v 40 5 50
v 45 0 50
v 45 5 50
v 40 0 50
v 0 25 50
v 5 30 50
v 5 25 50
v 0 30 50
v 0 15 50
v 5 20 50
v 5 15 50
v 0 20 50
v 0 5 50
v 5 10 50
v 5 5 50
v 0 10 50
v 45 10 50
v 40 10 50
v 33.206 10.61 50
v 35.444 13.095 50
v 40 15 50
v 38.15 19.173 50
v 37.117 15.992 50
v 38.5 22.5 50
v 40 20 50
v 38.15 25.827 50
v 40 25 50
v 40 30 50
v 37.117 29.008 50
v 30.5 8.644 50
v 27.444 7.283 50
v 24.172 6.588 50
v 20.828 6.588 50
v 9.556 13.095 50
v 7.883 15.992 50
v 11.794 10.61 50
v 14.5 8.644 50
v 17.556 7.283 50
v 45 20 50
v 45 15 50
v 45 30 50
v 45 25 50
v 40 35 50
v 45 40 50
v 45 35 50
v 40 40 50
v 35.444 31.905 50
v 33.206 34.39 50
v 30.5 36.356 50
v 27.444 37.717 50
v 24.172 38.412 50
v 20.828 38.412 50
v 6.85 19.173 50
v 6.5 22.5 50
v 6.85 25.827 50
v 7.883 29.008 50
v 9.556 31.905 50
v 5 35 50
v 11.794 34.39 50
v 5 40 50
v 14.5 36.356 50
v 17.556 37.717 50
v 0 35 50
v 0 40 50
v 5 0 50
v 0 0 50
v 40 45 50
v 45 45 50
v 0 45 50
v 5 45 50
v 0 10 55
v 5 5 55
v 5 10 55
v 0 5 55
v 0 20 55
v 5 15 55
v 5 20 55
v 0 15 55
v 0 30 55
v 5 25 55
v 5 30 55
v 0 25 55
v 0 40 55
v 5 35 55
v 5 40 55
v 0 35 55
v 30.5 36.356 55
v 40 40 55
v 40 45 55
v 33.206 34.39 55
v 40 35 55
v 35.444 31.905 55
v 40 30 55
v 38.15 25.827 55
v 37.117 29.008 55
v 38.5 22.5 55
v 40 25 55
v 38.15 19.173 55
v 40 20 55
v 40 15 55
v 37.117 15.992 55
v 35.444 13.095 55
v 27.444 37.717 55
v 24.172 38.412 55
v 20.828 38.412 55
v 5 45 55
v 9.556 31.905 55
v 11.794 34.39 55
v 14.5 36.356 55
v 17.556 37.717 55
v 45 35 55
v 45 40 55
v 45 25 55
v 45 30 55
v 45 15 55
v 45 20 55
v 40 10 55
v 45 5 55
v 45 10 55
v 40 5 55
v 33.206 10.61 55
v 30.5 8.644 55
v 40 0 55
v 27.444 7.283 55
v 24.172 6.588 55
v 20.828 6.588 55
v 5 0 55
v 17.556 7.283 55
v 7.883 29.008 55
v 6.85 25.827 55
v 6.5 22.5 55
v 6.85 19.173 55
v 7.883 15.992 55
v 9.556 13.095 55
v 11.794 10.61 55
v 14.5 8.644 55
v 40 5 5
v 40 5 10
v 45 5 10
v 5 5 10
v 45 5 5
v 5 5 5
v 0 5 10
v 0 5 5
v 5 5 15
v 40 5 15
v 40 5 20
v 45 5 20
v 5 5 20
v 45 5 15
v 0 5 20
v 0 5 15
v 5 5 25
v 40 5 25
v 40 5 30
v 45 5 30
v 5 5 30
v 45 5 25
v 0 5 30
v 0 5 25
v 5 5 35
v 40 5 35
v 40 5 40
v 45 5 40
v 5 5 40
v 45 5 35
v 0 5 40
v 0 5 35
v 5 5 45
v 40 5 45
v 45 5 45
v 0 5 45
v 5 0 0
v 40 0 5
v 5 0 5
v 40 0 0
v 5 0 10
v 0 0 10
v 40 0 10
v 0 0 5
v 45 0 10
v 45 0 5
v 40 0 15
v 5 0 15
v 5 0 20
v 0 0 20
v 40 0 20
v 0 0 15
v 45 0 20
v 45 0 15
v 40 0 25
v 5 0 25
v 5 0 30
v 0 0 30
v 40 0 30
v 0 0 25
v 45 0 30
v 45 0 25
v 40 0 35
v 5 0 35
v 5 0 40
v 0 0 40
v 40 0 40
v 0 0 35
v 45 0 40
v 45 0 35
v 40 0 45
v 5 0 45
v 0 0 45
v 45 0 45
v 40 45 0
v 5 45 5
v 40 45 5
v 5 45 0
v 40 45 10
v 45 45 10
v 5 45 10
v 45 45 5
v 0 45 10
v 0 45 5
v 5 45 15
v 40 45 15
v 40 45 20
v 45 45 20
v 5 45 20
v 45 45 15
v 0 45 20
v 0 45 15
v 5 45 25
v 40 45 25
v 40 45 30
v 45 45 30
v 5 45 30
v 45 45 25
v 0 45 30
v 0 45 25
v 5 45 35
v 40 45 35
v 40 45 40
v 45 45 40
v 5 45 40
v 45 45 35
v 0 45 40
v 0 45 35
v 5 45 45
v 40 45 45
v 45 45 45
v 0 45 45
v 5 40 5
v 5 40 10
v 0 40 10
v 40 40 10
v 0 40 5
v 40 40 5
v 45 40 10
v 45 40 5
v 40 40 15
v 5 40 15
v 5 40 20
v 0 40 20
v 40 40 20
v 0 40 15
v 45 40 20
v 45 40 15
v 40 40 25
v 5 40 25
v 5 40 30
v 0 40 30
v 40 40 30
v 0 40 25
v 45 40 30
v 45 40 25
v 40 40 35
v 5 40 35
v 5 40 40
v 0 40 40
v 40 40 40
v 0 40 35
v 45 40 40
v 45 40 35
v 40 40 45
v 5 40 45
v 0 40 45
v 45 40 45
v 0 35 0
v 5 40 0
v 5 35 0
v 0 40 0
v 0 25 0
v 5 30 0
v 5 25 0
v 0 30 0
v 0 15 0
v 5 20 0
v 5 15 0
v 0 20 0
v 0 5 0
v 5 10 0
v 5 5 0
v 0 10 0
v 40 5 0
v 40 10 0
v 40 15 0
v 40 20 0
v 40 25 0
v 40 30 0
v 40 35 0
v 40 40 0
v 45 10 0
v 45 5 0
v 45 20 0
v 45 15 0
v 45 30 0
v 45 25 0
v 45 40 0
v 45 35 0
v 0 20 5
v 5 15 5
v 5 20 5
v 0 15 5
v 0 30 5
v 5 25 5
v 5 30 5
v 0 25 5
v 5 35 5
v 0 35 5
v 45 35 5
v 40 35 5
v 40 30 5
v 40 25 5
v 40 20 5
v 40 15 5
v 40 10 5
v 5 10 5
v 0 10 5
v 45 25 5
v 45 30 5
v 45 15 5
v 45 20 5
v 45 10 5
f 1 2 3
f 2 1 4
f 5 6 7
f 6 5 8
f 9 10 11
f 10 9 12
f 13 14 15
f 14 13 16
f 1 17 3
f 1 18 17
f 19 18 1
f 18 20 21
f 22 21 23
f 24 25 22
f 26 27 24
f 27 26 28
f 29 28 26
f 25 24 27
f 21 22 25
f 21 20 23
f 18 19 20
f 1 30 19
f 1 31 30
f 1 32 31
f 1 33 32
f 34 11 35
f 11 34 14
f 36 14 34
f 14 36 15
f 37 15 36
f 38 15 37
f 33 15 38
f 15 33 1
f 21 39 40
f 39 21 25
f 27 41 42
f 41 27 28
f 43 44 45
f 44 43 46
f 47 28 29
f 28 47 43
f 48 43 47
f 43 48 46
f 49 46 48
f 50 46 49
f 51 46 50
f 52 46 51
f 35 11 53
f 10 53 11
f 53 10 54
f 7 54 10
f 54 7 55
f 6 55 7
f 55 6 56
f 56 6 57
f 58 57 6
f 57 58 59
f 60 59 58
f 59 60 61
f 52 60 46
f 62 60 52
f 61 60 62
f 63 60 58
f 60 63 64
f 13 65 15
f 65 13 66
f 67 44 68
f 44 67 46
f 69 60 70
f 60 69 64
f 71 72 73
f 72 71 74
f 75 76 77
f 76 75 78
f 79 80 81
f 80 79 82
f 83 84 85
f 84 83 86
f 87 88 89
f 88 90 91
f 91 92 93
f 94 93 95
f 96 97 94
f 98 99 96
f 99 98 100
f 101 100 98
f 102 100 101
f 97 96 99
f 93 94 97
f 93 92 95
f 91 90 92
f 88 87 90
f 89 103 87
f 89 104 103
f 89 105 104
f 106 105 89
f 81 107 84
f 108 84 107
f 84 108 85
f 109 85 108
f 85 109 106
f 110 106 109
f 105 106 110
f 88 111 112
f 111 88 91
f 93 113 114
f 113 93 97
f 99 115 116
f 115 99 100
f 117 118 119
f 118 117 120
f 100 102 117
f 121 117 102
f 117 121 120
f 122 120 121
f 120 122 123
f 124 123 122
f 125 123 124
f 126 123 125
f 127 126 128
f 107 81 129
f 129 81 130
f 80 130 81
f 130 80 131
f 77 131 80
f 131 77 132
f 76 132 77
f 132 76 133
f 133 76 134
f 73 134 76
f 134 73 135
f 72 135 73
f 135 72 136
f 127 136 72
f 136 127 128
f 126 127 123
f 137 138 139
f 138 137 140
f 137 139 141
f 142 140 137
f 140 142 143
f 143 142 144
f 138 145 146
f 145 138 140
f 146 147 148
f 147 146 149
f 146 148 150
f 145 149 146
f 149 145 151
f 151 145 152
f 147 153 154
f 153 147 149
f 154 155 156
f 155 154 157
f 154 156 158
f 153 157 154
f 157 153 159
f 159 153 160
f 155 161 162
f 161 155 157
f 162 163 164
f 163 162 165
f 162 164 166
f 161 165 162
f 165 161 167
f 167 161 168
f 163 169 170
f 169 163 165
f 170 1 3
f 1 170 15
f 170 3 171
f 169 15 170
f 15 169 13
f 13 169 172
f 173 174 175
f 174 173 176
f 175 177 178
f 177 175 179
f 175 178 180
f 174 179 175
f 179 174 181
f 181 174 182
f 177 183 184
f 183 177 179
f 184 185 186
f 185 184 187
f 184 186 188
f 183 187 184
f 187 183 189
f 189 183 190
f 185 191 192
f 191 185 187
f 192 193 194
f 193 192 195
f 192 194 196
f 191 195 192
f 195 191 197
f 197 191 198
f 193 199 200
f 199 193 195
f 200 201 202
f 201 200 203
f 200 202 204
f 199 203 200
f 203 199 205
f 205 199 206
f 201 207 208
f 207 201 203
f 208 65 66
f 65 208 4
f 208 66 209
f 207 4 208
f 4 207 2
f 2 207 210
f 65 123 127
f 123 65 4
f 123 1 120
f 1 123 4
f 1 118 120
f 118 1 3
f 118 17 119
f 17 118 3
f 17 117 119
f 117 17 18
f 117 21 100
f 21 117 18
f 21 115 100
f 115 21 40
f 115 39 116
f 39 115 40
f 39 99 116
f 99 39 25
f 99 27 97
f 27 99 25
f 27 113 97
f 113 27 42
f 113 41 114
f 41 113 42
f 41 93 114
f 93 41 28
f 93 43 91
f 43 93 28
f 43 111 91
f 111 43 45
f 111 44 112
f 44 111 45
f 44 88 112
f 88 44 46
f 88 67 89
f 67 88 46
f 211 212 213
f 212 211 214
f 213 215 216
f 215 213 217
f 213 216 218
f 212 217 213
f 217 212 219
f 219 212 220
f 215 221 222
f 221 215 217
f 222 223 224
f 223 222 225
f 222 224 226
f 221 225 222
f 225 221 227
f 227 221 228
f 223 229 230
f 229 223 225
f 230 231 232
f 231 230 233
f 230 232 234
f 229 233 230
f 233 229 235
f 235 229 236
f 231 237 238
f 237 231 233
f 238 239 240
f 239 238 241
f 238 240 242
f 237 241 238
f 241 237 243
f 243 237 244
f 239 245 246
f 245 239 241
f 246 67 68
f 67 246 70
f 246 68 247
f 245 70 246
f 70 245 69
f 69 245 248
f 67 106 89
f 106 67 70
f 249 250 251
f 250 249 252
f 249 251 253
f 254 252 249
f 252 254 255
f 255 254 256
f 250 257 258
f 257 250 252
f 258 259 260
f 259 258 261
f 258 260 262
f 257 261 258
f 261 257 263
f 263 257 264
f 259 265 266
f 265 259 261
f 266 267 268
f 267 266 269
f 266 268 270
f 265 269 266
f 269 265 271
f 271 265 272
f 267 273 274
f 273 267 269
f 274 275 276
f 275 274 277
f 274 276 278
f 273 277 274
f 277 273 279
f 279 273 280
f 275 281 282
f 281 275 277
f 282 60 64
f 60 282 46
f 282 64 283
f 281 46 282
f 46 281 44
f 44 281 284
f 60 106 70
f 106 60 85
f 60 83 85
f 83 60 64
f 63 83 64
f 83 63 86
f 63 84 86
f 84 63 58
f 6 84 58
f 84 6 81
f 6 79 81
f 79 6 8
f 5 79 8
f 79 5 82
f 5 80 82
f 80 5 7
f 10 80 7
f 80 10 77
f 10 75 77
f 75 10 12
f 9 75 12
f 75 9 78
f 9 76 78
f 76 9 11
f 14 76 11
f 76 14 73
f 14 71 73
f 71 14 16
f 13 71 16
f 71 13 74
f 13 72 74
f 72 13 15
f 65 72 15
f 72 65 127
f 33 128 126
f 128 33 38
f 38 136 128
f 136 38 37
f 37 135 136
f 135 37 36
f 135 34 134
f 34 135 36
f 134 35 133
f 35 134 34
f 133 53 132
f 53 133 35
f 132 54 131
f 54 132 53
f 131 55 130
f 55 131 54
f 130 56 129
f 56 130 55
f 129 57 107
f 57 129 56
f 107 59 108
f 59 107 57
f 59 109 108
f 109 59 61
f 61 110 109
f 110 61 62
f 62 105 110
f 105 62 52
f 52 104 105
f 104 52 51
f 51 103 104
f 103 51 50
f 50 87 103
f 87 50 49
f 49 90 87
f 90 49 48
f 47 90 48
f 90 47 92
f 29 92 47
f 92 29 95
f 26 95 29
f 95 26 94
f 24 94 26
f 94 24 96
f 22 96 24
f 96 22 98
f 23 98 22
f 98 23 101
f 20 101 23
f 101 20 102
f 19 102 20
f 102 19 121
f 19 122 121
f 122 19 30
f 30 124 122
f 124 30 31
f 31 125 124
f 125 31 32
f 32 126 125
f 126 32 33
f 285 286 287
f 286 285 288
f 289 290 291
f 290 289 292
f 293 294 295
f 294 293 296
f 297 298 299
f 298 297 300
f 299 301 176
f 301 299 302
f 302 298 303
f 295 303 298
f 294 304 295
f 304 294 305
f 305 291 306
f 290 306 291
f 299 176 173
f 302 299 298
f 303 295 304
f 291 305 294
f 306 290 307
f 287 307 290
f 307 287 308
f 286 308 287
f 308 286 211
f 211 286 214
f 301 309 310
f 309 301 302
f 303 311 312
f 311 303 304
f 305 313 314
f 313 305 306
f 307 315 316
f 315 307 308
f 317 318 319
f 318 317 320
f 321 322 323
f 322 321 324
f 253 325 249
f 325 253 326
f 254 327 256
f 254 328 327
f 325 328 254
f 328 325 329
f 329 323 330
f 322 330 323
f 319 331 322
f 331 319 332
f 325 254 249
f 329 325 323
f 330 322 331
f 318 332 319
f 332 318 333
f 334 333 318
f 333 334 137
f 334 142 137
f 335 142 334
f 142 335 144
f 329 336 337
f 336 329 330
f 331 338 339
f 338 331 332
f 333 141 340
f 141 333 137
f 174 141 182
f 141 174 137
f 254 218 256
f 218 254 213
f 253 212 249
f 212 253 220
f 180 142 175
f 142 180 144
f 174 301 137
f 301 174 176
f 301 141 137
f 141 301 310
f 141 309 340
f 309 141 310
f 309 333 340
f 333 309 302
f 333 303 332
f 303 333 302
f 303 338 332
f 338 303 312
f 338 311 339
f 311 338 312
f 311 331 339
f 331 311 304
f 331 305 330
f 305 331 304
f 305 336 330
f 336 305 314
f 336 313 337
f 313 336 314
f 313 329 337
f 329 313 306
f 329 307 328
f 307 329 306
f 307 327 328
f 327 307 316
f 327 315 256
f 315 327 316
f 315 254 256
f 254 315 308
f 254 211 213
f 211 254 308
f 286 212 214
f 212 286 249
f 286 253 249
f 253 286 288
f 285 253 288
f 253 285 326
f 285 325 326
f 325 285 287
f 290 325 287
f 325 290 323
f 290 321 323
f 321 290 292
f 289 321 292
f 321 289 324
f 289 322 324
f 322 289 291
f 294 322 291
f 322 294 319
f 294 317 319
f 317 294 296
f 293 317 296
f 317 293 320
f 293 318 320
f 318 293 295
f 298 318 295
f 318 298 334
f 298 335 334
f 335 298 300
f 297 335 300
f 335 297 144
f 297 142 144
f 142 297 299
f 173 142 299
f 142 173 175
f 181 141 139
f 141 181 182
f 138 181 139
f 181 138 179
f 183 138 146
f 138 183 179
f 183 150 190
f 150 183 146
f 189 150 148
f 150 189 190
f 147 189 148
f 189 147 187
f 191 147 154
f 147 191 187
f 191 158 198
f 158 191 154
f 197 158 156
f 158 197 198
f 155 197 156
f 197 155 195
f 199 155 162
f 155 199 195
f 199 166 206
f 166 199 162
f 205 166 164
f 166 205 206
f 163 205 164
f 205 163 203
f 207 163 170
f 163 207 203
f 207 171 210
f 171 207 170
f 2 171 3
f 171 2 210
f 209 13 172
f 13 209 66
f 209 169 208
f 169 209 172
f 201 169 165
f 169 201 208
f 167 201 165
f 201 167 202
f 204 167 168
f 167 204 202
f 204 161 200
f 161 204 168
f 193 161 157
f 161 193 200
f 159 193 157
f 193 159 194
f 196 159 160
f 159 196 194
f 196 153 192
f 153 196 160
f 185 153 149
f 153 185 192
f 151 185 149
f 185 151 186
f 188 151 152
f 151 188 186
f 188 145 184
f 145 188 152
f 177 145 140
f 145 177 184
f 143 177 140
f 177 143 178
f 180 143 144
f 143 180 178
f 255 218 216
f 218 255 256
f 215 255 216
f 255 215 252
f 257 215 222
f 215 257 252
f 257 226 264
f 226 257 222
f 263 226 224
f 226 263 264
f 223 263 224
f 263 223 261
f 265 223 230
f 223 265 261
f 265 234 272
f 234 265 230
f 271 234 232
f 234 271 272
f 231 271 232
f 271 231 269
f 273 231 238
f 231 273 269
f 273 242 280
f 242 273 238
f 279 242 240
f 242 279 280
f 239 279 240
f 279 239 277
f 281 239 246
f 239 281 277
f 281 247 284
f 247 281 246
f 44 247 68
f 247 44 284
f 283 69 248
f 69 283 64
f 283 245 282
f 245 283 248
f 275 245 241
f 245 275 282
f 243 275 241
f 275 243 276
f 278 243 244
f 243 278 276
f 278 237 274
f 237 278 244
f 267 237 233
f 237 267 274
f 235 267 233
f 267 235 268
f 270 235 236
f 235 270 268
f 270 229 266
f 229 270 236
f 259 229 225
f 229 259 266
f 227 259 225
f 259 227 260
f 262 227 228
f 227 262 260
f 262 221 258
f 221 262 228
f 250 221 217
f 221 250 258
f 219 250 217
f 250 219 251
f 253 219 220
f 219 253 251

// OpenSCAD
// file: params.scad
// total diameter of the magazine
outer_d = 75;

// thickness of the magazine walls
wall_l = 8;

// thickness of the riser walls in the magazine
riser_wall_l = 4;

// diameter of the holes for the bolts which hold the layers of the magazine together
bolt_d = 3;

// diameter of the holes for the setscrews which position the rounds to be fired next
setscrew_d = 2;

// diameter of the shaft of the bushing
bush_outer_d = 16;

bush_inner_d = 10;

// diameter of the flange of the bushing
bush_flange_d = 20;

// thickness of the flange of the bushing
bush_flange_h = 3;

// length of the bushing tfrom the top of the flange to the end of the shaft
bush_l = 10;

// thickness of material used for all the layers, except for the layer which accomodates the bushing flange, and the lexan lids
std_thickness = 4;

// thickness of lexan used for the manifold cover and the magazine cover
lexan_h = 1;

// number of barrels
barrel_count = 3;

// riser diameter
riser_d = 6.25;

// riser separation -- horizontal distance between adjacent riser centres
riser_sep = 10;

// radius of the filleting circle to smooth the magazine
// this needs to be tweaked -- if you have a narrow riser hull (i.e. small
// barrel_count/riser_sep), and you see flat sections,
// increase fillet_r
fillet_r = 10;
// file: base_params.scad
include <params.scad>

finger_width = 5;

function finger_count(l) = floor(l/finger_width) + (l % finger_width == 0 ? 0 : 1);

function next_odd(n) = n % 2 == 0 ? n + 1 : n;

function fingerable(x) = next_odd(finger_count(x)) * finger_width;


// diameter of the hole for the buna ball valve
valve_diameter = 12.5;

// diameter of the hole for mounting the mpa-7
mpa7_diameter = 10; //????

// accumulator inner diameter
acc_inner_d = 25.4;

// accumulator outer diameter
acc_outer_d = 35; //?

// thickness of ABS sheet
abs_thick = 5;

// clearance from hole in ABS to edge
abs_clearance = 5;

base_length = fingerable(bush_outer_d + abs_clearance * 2 + abs_thick * 2);

base_width = fingerable(bush_outer_d + abs_clearance * 2 + abs_thick * 2);

base_height = fingerable(acc_inner_d + abs_clearance * 2 + abs_thick * 2);
// main file
include <base_params.scad>

module fingers(start, length, x, y) {
	for (p = [start : finger_width * 2 : length]) {
		translate([x + p, y, 0]) {square([finger_width, abs_thick]);}
	}
}

module fingers_b(length, x, y) {
	fingers(0, length, x, y);
}


module fingers_l(height, x, y) {
	translate([abs_thick, 0, 0]) {rotate(90) { fingers(0, height, 0, 0); }}
}

module fingers_r(height, x, y) {
	translate([x - abs_thick, 0, 0]) { fingers_l(height, 0, 0); }
}

module fingers_t(length, x, y) {
	fingers_b(length, x, y - abs_thick);
}

module topbottom2d() {
	difference() {
		square([base_length, base_width]);
		fingers_t(base_length, 0, base_width);
		fingers_b(base_length, 0, 0);
		fingers_l(base_width, 0, 0);
		fingers_r(base_width, base_width, 0);
		}
}

module side2d() {
	difference() {
			square([base_height, base_width]);
			fingers(finger_width, base_height, 0, 0);
			fingers(finger_width, base_height, 0, base_width - abs_thick);
			translate([abs_thick, 0, 0]) {rotate(90) { fingers(finger_width, base_height, 0, 0); }}
			translate([base_height, 0, 0]) {rotate(90) { fingers(finger_width, base_height, 0, 0); }}
			}
}

module frontback2d() {
	difference() {
		square([base_length, base_height]);
		fingers(finger_width, base_length, 0, 0);
		fingers(finger_width, base_length, 0, base_height - abs_thick);
		translate([abs_thick, 0, 0]) {rotate(90) { fingers(0, base_height, 0, 0); }}
		translate([base_width, 0, 0]) {rotate(90) { fingers(0, base_height, 0, 0); }}

	}
}
//144
module top2d() {
	difference() {
		topbottom2d();
		translate([base_length/2, base_width/2, 0]) {circle(bush_outer_d);}
	}
}

module acc_side2d() {
	difference() {
		side2d();
		translate([base_height/2, base_width/2, 0]) {circle(valve_diameter);}
	}
}

module mpa7_side2d() {
	difference() {
		side2d();
		translate([base_height/2, base_width/2, 0]) {circle(mpa7_diameter);}
	}
}

module to3d() {
	linear_extrude(height=abs_thick) { child(0); }
}

module top() {
	translate([0,0,base_height - abs_thick]) {to3d() { top2d(); }}
}

module bottom() {
	to3d() { topbottom2d(); }
}

module acc_side() {
		translate([0,0,base_height]) { rotate(a=[0,90,0]) {to3d() { acc_side2d(); }}}
}

module mpa7_side() {
		translate([base_length - abs_thick,0,base_height]) { rotate(a=[0,90,0]) {to3d() { mpa7_side2d(); }}}
}

module front() {
		translate([0,abs_thick,0]) { rotate(a=[90,0,0]) {to3d() { frontback2d(); }}}
}

module back() {
		translate([0,base_width,0]) { rotate(a=[90,0,0]) {to3d() { frontback2d(); }}}
}

color([1,2,0,0.5]) {
	union() {
		top();
		bottom();
		acc_side();
		mpa7_side();
		front();
		back();
	}
}
